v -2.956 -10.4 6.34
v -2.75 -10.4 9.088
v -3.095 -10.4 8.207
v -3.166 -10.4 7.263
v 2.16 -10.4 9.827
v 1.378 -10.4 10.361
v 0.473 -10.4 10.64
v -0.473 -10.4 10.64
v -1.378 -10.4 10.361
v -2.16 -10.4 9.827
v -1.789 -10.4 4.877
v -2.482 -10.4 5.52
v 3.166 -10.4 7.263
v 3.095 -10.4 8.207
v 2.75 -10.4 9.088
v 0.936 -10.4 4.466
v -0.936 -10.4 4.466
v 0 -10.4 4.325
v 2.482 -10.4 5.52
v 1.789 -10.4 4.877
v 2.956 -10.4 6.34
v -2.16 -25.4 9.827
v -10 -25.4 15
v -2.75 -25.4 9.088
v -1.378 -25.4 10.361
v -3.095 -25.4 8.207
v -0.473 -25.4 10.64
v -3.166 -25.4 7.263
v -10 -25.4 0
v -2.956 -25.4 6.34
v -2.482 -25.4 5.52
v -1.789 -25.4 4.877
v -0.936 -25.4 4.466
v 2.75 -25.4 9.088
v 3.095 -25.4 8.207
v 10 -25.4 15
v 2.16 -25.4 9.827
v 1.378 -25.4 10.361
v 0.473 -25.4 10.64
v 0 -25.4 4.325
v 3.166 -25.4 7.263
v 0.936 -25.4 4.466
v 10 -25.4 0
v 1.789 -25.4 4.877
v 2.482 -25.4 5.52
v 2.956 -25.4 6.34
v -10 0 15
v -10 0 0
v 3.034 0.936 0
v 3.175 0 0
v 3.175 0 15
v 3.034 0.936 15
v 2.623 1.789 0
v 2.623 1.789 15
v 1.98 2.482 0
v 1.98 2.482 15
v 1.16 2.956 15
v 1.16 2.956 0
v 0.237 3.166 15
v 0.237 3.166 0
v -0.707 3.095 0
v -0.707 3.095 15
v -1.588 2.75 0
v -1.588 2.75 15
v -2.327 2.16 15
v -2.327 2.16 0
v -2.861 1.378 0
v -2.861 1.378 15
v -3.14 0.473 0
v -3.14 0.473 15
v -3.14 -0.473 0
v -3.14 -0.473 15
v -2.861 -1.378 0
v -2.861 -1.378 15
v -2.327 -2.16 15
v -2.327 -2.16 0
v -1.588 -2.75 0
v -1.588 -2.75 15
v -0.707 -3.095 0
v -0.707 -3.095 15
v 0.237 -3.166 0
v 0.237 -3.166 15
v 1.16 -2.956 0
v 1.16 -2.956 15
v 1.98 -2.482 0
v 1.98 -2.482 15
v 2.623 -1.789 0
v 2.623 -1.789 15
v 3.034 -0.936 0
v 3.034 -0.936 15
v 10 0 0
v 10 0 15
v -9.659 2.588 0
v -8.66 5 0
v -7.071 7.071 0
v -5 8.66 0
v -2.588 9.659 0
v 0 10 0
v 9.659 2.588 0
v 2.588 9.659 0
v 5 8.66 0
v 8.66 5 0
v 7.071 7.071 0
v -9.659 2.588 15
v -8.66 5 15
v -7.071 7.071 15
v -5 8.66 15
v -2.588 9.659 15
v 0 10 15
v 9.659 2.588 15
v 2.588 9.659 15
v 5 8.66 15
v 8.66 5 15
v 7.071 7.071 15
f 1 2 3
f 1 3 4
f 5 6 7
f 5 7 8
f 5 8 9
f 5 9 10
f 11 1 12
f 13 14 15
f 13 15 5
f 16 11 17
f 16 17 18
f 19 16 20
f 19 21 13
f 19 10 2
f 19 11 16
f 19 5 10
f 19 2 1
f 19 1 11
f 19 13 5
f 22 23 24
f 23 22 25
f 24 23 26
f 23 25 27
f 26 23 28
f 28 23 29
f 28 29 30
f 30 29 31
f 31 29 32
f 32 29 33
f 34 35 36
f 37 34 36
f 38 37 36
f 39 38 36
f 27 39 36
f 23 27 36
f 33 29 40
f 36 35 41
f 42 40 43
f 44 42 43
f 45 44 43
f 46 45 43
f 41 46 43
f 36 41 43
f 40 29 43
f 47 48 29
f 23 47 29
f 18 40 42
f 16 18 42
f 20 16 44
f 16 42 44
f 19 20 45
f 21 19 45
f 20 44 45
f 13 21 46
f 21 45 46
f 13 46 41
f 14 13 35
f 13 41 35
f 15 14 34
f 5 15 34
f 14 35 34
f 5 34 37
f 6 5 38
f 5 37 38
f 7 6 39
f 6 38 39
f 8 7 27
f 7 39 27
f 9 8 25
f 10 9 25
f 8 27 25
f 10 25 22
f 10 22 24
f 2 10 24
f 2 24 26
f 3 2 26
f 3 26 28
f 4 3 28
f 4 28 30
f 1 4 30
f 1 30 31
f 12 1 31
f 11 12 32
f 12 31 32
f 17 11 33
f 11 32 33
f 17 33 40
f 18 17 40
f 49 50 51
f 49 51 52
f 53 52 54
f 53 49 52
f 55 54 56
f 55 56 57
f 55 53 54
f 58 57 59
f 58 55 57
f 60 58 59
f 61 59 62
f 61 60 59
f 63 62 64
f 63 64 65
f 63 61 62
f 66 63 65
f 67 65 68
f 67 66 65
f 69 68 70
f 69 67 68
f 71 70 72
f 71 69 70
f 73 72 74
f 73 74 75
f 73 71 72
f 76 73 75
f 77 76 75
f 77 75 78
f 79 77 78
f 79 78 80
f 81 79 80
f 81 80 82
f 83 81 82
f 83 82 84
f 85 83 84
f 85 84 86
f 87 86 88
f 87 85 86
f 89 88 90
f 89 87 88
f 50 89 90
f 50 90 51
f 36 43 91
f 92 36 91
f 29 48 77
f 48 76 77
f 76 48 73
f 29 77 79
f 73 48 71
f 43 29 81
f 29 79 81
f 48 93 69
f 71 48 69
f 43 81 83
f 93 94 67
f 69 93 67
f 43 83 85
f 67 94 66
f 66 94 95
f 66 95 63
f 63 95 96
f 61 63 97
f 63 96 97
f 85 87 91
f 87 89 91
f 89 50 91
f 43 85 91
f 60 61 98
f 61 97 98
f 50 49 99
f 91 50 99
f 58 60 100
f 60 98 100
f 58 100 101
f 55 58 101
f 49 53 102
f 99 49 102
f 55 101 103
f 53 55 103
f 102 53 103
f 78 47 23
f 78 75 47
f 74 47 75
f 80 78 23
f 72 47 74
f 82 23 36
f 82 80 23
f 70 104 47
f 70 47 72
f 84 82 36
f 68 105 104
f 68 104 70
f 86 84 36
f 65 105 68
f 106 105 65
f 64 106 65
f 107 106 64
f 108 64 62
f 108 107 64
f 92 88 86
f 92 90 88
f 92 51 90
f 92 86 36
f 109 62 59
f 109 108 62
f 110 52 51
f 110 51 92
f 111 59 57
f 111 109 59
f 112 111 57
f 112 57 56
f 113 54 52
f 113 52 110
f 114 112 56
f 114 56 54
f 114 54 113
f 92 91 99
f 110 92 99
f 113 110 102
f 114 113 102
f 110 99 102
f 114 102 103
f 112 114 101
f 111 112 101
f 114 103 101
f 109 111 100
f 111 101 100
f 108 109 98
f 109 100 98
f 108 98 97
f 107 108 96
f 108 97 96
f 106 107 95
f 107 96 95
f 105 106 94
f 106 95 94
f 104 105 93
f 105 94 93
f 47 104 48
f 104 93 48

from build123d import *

# Parameters (mm, degrees)
SKETCH1_R           = 3.175
BOSS_EXTRUDE1_DEPTH = 15
SKETCH2_R           = 3.175
CUT_EXTRUDE1_DEPTH  = 15


with BuildPart() as part:
    # Sketch1 → Boss-Extrude1 (new body)
    with BuildSketch(Plane.XY):
        with BuildLine():
            Line((-10, 0), (-10, -25.4))
            Line((-10, -25.4), (10, -25.4))
            Line((10, -25.4), (10, 0))
            ThreePointArc((10, 0), (0, 10), (-10, 0))
        make_face()
        Circle(SKETCH1_R, mode=Mode.SUBTRACT)
    extrude(amount=BOSS_EXTRUDE1_DEPTH)

    # Sketch2 → Cut-Extrude1 (cut)
    with BuildSketch(Plane.XZ.offset(25.4)):
        with Locations(Location((0, 7.5, 0), (0, 0, 270))):
            Circle(SKETCH2_R)
    extrude(amount=-CUT_EXTRUDE1_DEPTH, mode=Mode.SUBTRACT)


solid = part.part
